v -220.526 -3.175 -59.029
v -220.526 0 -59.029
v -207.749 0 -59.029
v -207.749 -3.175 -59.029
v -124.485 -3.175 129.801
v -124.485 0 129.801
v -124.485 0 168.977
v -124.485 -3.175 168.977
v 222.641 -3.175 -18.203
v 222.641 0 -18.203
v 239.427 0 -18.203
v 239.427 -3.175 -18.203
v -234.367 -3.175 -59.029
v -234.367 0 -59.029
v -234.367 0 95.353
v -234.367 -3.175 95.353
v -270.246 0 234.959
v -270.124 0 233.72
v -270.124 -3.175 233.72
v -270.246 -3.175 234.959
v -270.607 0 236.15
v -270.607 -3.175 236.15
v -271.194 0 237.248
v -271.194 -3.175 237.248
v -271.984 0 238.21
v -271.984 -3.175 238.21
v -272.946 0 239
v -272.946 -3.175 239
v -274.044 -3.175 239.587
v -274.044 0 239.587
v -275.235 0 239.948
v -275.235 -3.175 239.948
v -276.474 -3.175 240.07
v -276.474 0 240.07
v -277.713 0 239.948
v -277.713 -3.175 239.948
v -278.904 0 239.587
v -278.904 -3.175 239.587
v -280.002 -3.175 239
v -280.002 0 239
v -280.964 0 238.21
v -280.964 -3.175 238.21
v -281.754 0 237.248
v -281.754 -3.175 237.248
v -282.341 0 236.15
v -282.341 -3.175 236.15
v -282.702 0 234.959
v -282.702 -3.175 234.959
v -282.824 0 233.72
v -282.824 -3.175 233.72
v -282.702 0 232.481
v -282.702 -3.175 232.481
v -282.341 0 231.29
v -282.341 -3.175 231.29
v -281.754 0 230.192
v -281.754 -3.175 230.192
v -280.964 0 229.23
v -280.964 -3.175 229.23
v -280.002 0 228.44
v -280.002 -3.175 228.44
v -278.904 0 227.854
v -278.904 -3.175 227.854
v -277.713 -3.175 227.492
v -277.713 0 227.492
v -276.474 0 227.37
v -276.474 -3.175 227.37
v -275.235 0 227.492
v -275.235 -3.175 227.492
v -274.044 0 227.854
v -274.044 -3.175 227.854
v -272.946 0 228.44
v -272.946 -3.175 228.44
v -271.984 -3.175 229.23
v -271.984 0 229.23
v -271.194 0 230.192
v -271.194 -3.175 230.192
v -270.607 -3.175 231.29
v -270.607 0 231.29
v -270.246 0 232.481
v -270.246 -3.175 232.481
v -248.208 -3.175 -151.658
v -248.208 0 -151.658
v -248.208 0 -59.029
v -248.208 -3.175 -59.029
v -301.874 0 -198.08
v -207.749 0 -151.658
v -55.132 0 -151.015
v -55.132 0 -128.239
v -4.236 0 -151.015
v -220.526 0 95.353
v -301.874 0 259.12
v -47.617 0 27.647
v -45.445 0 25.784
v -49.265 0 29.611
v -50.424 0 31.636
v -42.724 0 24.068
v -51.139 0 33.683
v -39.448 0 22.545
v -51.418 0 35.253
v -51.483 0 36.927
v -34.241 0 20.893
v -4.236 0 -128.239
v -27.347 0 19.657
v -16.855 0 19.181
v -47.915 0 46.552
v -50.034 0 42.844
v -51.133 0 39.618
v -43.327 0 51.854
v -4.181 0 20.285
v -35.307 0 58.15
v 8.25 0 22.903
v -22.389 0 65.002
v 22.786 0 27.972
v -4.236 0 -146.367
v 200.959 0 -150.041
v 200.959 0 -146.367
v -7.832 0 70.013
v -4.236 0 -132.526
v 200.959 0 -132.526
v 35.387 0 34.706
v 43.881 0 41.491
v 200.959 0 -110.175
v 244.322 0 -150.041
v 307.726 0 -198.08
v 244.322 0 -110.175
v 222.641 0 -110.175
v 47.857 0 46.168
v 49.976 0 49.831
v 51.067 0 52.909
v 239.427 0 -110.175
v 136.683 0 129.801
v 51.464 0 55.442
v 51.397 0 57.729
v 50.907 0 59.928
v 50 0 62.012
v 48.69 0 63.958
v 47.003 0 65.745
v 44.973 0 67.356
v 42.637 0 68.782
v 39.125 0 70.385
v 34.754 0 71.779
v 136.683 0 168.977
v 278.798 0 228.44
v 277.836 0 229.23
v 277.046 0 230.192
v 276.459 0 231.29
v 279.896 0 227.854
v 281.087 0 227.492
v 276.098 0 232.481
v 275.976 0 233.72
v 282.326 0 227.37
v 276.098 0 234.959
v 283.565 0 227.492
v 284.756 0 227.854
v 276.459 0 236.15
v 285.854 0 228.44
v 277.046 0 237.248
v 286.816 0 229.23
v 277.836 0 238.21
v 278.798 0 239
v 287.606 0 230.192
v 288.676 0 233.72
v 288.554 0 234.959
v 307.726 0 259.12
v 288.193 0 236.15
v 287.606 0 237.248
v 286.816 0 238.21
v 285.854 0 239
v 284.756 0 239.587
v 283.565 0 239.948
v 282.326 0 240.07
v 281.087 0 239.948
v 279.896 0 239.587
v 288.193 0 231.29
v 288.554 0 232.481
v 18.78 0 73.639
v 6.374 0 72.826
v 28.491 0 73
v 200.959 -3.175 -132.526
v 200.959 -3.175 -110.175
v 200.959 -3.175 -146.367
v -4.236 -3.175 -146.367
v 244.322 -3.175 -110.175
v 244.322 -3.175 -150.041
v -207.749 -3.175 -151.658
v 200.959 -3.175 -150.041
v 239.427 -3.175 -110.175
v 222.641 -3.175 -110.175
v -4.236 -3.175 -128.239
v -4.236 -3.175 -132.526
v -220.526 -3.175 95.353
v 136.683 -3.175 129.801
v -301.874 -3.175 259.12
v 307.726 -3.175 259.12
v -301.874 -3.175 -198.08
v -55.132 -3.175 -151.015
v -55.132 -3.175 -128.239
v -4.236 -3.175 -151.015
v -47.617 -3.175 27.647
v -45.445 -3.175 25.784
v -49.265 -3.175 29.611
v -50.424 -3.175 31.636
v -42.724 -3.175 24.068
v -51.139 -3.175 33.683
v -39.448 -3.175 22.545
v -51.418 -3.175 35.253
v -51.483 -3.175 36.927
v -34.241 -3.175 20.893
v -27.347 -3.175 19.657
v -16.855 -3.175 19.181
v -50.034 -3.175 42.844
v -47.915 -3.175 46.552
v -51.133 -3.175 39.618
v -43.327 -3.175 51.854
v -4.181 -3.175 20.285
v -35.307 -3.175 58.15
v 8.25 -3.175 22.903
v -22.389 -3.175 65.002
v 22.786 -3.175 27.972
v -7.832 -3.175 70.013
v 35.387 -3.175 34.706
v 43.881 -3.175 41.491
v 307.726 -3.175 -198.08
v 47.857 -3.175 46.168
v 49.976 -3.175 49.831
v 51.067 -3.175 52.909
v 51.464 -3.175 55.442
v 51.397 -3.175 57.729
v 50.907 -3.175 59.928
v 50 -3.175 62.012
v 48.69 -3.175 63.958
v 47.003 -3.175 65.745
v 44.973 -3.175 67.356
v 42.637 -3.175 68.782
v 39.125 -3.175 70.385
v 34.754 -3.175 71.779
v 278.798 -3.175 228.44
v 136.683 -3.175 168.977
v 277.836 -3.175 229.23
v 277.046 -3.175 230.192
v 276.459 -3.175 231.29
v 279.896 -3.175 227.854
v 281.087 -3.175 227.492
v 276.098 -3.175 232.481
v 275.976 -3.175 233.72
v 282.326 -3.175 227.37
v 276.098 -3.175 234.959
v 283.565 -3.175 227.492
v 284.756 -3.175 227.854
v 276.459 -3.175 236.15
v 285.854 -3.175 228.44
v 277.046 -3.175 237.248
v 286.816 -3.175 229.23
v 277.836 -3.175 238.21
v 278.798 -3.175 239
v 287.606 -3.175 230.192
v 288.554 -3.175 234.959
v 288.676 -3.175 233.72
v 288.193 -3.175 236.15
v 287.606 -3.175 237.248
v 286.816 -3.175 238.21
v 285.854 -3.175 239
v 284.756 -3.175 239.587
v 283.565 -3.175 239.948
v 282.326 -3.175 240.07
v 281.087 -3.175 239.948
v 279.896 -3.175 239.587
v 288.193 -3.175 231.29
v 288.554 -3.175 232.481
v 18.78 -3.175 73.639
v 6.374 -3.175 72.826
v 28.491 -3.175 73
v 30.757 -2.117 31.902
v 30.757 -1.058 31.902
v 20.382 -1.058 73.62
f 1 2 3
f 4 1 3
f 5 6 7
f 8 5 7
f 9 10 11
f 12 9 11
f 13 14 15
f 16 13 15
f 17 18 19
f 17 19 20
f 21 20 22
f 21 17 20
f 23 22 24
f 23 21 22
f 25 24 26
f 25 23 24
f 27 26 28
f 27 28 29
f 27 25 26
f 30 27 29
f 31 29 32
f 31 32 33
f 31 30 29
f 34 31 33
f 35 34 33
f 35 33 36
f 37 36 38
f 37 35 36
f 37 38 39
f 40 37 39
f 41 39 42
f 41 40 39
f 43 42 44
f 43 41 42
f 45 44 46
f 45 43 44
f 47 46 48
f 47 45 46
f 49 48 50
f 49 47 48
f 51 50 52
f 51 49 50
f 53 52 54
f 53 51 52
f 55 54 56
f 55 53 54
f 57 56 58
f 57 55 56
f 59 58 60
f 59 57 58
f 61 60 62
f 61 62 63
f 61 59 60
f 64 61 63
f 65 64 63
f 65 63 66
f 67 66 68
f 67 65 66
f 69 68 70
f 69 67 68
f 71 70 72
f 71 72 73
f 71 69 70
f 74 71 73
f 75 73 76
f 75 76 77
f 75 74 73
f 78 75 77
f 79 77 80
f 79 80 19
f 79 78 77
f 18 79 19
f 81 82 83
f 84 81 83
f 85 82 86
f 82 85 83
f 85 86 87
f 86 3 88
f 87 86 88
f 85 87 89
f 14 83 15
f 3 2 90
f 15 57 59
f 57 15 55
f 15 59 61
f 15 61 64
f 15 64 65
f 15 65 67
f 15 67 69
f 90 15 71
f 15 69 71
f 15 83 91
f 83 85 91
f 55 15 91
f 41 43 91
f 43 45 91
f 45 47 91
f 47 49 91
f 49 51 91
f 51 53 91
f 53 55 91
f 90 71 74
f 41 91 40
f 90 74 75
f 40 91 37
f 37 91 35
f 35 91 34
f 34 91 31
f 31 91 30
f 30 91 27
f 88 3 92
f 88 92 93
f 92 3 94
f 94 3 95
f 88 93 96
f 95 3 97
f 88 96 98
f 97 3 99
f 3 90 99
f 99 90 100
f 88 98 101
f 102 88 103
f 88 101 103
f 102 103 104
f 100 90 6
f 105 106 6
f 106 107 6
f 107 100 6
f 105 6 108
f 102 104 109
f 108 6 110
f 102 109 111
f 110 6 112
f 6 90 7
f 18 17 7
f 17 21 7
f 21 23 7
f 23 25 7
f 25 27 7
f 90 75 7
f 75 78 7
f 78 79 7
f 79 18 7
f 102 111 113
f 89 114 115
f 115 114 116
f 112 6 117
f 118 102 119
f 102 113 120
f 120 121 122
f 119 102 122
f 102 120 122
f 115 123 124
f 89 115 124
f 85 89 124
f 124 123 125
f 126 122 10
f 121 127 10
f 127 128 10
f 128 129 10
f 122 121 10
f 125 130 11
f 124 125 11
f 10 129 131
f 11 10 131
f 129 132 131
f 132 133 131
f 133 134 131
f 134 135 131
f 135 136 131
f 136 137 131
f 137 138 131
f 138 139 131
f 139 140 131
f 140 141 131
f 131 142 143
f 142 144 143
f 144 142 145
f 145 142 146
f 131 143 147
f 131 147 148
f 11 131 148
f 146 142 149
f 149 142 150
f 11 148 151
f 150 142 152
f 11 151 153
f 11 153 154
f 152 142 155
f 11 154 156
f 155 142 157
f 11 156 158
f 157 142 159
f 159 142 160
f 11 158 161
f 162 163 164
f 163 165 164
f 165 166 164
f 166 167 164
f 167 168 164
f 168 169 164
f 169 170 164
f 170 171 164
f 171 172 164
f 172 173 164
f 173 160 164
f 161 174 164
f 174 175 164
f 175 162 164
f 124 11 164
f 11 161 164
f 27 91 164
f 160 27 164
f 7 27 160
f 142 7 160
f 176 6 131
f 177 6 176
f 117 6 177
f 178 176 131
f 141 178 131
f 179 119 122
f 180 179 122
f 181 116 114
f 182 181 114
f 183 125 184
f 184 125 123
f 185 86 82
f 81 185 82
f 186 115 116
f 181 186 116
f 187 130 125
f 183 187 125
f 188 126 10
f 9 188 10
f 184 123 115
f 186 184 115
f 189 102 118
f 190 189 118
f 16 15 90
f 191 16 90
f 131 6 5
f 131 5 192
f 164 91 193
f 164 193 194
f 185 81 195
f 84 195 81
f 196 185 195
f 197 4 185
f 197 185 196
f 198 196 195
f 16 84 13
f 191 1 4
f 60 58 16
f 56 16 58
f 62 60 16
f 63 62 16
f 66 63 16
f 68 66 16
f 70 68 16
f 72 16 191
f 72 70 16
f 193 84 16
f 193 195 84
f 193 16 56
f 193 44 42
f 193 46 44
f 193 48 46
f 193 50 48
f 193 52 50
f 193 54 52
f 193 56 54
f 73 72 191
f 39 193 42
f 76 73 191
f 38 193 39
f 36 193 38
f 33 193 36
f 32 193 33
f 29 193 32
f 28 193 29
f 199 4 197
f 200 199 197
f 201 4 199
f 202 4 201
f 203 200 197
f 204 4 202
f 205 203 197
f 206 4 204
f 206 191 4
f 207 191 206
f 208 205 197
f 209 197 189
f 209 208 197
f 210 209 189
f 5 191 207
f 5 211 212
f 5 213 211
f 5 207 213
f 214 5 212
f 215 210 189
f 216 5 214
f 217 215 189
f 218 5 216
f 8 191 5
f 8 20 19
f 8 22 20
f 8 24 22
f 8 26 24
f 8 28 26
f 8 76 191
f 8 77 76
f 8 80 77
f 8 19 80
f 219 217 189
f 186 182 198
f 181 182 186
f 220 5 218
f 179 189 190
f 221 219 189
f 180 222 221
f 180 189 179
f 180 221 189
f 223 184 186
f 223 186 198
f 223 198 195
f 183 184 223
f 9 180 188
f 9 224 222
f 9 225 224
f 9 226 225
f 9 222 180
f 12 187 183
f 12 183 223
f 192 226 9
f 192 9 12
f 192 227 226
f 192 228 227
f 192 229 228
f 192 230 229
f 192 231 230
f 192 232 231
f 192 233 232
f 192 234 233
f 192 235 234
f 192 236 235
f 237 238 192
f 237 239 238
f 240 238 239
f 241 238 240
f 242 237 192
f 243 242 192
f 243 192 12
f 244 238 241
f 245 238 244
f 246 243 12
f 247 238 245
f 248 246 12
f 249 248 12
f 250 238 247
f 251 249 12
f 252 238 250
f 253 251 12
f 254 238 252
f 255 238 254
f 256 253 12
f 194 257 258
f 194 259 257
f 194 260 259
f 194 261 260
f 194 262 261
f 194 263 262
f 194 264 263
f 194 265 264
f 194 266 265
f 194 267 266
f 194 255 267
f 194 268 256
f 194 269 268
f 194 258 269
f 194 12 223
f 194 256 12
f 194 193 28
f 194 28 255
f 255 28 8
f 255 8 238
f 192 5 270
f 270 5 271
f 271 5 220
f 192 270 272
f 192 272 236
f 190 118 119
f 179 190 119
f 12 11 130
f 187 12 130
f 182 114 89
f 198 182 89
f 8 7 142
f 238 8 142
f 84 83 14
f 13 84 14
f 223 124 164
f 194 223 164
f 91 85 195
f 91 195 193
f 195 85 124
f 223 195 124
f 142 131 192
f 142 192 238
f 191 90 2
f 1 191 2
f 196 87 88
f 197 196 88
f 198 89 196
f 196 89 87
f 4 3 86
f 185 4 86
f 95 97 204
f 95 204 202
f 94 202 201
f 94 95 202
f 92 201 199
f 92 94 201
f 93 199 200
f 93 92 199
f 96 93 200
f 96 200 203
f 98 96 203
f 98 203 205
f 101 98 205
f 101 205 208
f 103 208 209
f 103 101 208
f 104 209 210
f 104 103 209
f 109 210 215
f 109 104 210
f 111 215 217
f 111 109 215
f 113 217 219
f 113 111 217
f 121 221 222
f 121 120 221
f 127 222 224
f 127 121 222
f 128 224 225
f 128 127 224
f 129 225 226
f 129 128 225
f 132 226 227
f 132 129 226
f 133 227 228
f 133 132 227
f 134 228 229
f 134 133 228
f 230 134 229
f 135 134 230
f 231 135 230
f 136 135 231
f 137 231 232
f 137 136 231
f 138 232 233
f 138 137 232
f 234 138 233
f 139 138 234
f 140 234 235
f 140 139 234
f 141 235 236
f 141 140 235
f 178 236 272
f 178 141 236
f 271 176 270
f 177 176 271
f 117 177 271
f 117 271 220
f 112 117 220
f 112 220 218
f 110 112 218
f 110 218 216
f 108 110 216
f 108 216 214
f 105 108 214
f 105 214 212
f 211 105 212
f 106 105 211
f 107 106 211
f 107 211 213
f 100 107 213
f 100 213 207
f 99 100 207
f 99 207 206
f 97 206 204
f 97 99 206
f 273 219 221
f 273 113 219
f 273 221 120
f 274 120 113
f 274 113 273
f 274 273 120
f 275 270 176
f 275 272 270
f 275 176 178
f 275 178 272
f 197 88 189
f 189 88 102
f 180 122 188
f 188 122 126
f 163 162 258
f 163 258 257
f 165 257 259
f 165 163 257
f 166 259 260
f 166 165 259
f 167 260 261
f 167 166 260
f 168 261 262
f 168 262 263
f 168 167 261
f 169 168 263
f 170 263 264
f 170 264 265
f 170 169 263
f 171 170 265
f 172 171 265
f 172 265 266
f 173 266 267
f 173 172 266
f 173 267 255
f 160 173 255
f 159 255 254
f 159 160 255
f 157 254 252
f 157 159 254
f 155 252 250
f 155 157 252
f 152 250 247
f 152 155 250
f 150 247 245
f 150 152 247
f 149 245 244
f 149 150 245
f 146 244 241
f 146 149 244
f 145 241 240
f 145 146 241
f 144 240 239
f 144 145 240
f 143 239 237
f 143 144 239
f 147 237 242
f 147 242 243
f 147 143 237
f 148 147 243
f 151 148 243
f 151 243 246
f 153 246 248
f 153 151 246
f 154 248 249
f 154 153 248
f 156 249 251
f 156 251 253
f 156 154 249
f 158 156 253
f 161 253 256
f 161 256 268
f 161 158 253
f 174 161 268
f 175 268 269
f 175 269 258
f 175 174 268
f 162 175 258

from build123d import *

# Parameters (mm, degrees)
F0_W     = 609.6
F0_H     = 457.2
F0_R     = 6.35
F0_W_2   = 261.167854
F0_H_2   = 39.175182
F1_DEPTH = 3.175


with BuildPart() as f1:
    # F0 (on Front) → F1 (new body)
    with BuildSketch(Plane.XZ):
        with Locations((2.926078, 30.520323)):
            Rectangle(F0_W, F0_H)
        Polygon((-234.366894, -59.028838), (-234.366894, 95.353276), (-220.525727, 95.353276), (-220.525727, -59.028838), (-207.749292, -59.028838), (-207.749292, -151.658103), (-248.208046, -151.658103), (-248.208046, -59.028838), align=None, mode=Mode.SUBTRACT)
        Polygon((-4.236173, -128.238574), (-4.236173, -132.526398), (200.95925, -132.526398), (200.95925, -110.175043), (222.640842, -110.175043), (222.640842, -18.203117), (239.426598, -18.203117), (239.426598, -110.175043), (244.322434, -110.175043), (244.322434, -150.041208), (200.95925, -150.041208), (200.95925, -146.367162), (-4.236173, -146.367162), (-4.236173, -151.014999), (-55.13164, -151.014999), (-55.13164, -128.238574), align=None, mode=Mode.SUBTRACT)
        with BuildLine():
            add(Edge.make_bspline(
                [(-51.138811, 33.683006), (-40.763055, -8.035491), (30.757283, 31.901763), (102.277622, 71.839016), (20.381528, 73.620259), (-61.514566, 75.401502), (-51.138811, 33.683006)],
                knots=[0, 0, 0, 2.094395, 2.094395, 4.18879, 4.18879, 6.283185, 6.283185, 6.283185], degree=2, weights=[1, 0.5, 1, 0.5, 1, 0.5, 1]))
        make_face(mode=Mode.SUBTRACT)
        with Locations((-276.473922, 233.720323)):
            Circle(F0_R, mode=Mode.SUBTRACT)
        with Locations((6.09912, 149.388954)):
            Rectangle(F0_W_2, F0_H_2, mode=Mode.SUBTRACT)
        with Locations((282.326078, 233.720323)):
            Circle(F0_R, mode=Mode.SUBTRACT)
    extrude(amount=F1_DEPTH)


solid = f1.part
